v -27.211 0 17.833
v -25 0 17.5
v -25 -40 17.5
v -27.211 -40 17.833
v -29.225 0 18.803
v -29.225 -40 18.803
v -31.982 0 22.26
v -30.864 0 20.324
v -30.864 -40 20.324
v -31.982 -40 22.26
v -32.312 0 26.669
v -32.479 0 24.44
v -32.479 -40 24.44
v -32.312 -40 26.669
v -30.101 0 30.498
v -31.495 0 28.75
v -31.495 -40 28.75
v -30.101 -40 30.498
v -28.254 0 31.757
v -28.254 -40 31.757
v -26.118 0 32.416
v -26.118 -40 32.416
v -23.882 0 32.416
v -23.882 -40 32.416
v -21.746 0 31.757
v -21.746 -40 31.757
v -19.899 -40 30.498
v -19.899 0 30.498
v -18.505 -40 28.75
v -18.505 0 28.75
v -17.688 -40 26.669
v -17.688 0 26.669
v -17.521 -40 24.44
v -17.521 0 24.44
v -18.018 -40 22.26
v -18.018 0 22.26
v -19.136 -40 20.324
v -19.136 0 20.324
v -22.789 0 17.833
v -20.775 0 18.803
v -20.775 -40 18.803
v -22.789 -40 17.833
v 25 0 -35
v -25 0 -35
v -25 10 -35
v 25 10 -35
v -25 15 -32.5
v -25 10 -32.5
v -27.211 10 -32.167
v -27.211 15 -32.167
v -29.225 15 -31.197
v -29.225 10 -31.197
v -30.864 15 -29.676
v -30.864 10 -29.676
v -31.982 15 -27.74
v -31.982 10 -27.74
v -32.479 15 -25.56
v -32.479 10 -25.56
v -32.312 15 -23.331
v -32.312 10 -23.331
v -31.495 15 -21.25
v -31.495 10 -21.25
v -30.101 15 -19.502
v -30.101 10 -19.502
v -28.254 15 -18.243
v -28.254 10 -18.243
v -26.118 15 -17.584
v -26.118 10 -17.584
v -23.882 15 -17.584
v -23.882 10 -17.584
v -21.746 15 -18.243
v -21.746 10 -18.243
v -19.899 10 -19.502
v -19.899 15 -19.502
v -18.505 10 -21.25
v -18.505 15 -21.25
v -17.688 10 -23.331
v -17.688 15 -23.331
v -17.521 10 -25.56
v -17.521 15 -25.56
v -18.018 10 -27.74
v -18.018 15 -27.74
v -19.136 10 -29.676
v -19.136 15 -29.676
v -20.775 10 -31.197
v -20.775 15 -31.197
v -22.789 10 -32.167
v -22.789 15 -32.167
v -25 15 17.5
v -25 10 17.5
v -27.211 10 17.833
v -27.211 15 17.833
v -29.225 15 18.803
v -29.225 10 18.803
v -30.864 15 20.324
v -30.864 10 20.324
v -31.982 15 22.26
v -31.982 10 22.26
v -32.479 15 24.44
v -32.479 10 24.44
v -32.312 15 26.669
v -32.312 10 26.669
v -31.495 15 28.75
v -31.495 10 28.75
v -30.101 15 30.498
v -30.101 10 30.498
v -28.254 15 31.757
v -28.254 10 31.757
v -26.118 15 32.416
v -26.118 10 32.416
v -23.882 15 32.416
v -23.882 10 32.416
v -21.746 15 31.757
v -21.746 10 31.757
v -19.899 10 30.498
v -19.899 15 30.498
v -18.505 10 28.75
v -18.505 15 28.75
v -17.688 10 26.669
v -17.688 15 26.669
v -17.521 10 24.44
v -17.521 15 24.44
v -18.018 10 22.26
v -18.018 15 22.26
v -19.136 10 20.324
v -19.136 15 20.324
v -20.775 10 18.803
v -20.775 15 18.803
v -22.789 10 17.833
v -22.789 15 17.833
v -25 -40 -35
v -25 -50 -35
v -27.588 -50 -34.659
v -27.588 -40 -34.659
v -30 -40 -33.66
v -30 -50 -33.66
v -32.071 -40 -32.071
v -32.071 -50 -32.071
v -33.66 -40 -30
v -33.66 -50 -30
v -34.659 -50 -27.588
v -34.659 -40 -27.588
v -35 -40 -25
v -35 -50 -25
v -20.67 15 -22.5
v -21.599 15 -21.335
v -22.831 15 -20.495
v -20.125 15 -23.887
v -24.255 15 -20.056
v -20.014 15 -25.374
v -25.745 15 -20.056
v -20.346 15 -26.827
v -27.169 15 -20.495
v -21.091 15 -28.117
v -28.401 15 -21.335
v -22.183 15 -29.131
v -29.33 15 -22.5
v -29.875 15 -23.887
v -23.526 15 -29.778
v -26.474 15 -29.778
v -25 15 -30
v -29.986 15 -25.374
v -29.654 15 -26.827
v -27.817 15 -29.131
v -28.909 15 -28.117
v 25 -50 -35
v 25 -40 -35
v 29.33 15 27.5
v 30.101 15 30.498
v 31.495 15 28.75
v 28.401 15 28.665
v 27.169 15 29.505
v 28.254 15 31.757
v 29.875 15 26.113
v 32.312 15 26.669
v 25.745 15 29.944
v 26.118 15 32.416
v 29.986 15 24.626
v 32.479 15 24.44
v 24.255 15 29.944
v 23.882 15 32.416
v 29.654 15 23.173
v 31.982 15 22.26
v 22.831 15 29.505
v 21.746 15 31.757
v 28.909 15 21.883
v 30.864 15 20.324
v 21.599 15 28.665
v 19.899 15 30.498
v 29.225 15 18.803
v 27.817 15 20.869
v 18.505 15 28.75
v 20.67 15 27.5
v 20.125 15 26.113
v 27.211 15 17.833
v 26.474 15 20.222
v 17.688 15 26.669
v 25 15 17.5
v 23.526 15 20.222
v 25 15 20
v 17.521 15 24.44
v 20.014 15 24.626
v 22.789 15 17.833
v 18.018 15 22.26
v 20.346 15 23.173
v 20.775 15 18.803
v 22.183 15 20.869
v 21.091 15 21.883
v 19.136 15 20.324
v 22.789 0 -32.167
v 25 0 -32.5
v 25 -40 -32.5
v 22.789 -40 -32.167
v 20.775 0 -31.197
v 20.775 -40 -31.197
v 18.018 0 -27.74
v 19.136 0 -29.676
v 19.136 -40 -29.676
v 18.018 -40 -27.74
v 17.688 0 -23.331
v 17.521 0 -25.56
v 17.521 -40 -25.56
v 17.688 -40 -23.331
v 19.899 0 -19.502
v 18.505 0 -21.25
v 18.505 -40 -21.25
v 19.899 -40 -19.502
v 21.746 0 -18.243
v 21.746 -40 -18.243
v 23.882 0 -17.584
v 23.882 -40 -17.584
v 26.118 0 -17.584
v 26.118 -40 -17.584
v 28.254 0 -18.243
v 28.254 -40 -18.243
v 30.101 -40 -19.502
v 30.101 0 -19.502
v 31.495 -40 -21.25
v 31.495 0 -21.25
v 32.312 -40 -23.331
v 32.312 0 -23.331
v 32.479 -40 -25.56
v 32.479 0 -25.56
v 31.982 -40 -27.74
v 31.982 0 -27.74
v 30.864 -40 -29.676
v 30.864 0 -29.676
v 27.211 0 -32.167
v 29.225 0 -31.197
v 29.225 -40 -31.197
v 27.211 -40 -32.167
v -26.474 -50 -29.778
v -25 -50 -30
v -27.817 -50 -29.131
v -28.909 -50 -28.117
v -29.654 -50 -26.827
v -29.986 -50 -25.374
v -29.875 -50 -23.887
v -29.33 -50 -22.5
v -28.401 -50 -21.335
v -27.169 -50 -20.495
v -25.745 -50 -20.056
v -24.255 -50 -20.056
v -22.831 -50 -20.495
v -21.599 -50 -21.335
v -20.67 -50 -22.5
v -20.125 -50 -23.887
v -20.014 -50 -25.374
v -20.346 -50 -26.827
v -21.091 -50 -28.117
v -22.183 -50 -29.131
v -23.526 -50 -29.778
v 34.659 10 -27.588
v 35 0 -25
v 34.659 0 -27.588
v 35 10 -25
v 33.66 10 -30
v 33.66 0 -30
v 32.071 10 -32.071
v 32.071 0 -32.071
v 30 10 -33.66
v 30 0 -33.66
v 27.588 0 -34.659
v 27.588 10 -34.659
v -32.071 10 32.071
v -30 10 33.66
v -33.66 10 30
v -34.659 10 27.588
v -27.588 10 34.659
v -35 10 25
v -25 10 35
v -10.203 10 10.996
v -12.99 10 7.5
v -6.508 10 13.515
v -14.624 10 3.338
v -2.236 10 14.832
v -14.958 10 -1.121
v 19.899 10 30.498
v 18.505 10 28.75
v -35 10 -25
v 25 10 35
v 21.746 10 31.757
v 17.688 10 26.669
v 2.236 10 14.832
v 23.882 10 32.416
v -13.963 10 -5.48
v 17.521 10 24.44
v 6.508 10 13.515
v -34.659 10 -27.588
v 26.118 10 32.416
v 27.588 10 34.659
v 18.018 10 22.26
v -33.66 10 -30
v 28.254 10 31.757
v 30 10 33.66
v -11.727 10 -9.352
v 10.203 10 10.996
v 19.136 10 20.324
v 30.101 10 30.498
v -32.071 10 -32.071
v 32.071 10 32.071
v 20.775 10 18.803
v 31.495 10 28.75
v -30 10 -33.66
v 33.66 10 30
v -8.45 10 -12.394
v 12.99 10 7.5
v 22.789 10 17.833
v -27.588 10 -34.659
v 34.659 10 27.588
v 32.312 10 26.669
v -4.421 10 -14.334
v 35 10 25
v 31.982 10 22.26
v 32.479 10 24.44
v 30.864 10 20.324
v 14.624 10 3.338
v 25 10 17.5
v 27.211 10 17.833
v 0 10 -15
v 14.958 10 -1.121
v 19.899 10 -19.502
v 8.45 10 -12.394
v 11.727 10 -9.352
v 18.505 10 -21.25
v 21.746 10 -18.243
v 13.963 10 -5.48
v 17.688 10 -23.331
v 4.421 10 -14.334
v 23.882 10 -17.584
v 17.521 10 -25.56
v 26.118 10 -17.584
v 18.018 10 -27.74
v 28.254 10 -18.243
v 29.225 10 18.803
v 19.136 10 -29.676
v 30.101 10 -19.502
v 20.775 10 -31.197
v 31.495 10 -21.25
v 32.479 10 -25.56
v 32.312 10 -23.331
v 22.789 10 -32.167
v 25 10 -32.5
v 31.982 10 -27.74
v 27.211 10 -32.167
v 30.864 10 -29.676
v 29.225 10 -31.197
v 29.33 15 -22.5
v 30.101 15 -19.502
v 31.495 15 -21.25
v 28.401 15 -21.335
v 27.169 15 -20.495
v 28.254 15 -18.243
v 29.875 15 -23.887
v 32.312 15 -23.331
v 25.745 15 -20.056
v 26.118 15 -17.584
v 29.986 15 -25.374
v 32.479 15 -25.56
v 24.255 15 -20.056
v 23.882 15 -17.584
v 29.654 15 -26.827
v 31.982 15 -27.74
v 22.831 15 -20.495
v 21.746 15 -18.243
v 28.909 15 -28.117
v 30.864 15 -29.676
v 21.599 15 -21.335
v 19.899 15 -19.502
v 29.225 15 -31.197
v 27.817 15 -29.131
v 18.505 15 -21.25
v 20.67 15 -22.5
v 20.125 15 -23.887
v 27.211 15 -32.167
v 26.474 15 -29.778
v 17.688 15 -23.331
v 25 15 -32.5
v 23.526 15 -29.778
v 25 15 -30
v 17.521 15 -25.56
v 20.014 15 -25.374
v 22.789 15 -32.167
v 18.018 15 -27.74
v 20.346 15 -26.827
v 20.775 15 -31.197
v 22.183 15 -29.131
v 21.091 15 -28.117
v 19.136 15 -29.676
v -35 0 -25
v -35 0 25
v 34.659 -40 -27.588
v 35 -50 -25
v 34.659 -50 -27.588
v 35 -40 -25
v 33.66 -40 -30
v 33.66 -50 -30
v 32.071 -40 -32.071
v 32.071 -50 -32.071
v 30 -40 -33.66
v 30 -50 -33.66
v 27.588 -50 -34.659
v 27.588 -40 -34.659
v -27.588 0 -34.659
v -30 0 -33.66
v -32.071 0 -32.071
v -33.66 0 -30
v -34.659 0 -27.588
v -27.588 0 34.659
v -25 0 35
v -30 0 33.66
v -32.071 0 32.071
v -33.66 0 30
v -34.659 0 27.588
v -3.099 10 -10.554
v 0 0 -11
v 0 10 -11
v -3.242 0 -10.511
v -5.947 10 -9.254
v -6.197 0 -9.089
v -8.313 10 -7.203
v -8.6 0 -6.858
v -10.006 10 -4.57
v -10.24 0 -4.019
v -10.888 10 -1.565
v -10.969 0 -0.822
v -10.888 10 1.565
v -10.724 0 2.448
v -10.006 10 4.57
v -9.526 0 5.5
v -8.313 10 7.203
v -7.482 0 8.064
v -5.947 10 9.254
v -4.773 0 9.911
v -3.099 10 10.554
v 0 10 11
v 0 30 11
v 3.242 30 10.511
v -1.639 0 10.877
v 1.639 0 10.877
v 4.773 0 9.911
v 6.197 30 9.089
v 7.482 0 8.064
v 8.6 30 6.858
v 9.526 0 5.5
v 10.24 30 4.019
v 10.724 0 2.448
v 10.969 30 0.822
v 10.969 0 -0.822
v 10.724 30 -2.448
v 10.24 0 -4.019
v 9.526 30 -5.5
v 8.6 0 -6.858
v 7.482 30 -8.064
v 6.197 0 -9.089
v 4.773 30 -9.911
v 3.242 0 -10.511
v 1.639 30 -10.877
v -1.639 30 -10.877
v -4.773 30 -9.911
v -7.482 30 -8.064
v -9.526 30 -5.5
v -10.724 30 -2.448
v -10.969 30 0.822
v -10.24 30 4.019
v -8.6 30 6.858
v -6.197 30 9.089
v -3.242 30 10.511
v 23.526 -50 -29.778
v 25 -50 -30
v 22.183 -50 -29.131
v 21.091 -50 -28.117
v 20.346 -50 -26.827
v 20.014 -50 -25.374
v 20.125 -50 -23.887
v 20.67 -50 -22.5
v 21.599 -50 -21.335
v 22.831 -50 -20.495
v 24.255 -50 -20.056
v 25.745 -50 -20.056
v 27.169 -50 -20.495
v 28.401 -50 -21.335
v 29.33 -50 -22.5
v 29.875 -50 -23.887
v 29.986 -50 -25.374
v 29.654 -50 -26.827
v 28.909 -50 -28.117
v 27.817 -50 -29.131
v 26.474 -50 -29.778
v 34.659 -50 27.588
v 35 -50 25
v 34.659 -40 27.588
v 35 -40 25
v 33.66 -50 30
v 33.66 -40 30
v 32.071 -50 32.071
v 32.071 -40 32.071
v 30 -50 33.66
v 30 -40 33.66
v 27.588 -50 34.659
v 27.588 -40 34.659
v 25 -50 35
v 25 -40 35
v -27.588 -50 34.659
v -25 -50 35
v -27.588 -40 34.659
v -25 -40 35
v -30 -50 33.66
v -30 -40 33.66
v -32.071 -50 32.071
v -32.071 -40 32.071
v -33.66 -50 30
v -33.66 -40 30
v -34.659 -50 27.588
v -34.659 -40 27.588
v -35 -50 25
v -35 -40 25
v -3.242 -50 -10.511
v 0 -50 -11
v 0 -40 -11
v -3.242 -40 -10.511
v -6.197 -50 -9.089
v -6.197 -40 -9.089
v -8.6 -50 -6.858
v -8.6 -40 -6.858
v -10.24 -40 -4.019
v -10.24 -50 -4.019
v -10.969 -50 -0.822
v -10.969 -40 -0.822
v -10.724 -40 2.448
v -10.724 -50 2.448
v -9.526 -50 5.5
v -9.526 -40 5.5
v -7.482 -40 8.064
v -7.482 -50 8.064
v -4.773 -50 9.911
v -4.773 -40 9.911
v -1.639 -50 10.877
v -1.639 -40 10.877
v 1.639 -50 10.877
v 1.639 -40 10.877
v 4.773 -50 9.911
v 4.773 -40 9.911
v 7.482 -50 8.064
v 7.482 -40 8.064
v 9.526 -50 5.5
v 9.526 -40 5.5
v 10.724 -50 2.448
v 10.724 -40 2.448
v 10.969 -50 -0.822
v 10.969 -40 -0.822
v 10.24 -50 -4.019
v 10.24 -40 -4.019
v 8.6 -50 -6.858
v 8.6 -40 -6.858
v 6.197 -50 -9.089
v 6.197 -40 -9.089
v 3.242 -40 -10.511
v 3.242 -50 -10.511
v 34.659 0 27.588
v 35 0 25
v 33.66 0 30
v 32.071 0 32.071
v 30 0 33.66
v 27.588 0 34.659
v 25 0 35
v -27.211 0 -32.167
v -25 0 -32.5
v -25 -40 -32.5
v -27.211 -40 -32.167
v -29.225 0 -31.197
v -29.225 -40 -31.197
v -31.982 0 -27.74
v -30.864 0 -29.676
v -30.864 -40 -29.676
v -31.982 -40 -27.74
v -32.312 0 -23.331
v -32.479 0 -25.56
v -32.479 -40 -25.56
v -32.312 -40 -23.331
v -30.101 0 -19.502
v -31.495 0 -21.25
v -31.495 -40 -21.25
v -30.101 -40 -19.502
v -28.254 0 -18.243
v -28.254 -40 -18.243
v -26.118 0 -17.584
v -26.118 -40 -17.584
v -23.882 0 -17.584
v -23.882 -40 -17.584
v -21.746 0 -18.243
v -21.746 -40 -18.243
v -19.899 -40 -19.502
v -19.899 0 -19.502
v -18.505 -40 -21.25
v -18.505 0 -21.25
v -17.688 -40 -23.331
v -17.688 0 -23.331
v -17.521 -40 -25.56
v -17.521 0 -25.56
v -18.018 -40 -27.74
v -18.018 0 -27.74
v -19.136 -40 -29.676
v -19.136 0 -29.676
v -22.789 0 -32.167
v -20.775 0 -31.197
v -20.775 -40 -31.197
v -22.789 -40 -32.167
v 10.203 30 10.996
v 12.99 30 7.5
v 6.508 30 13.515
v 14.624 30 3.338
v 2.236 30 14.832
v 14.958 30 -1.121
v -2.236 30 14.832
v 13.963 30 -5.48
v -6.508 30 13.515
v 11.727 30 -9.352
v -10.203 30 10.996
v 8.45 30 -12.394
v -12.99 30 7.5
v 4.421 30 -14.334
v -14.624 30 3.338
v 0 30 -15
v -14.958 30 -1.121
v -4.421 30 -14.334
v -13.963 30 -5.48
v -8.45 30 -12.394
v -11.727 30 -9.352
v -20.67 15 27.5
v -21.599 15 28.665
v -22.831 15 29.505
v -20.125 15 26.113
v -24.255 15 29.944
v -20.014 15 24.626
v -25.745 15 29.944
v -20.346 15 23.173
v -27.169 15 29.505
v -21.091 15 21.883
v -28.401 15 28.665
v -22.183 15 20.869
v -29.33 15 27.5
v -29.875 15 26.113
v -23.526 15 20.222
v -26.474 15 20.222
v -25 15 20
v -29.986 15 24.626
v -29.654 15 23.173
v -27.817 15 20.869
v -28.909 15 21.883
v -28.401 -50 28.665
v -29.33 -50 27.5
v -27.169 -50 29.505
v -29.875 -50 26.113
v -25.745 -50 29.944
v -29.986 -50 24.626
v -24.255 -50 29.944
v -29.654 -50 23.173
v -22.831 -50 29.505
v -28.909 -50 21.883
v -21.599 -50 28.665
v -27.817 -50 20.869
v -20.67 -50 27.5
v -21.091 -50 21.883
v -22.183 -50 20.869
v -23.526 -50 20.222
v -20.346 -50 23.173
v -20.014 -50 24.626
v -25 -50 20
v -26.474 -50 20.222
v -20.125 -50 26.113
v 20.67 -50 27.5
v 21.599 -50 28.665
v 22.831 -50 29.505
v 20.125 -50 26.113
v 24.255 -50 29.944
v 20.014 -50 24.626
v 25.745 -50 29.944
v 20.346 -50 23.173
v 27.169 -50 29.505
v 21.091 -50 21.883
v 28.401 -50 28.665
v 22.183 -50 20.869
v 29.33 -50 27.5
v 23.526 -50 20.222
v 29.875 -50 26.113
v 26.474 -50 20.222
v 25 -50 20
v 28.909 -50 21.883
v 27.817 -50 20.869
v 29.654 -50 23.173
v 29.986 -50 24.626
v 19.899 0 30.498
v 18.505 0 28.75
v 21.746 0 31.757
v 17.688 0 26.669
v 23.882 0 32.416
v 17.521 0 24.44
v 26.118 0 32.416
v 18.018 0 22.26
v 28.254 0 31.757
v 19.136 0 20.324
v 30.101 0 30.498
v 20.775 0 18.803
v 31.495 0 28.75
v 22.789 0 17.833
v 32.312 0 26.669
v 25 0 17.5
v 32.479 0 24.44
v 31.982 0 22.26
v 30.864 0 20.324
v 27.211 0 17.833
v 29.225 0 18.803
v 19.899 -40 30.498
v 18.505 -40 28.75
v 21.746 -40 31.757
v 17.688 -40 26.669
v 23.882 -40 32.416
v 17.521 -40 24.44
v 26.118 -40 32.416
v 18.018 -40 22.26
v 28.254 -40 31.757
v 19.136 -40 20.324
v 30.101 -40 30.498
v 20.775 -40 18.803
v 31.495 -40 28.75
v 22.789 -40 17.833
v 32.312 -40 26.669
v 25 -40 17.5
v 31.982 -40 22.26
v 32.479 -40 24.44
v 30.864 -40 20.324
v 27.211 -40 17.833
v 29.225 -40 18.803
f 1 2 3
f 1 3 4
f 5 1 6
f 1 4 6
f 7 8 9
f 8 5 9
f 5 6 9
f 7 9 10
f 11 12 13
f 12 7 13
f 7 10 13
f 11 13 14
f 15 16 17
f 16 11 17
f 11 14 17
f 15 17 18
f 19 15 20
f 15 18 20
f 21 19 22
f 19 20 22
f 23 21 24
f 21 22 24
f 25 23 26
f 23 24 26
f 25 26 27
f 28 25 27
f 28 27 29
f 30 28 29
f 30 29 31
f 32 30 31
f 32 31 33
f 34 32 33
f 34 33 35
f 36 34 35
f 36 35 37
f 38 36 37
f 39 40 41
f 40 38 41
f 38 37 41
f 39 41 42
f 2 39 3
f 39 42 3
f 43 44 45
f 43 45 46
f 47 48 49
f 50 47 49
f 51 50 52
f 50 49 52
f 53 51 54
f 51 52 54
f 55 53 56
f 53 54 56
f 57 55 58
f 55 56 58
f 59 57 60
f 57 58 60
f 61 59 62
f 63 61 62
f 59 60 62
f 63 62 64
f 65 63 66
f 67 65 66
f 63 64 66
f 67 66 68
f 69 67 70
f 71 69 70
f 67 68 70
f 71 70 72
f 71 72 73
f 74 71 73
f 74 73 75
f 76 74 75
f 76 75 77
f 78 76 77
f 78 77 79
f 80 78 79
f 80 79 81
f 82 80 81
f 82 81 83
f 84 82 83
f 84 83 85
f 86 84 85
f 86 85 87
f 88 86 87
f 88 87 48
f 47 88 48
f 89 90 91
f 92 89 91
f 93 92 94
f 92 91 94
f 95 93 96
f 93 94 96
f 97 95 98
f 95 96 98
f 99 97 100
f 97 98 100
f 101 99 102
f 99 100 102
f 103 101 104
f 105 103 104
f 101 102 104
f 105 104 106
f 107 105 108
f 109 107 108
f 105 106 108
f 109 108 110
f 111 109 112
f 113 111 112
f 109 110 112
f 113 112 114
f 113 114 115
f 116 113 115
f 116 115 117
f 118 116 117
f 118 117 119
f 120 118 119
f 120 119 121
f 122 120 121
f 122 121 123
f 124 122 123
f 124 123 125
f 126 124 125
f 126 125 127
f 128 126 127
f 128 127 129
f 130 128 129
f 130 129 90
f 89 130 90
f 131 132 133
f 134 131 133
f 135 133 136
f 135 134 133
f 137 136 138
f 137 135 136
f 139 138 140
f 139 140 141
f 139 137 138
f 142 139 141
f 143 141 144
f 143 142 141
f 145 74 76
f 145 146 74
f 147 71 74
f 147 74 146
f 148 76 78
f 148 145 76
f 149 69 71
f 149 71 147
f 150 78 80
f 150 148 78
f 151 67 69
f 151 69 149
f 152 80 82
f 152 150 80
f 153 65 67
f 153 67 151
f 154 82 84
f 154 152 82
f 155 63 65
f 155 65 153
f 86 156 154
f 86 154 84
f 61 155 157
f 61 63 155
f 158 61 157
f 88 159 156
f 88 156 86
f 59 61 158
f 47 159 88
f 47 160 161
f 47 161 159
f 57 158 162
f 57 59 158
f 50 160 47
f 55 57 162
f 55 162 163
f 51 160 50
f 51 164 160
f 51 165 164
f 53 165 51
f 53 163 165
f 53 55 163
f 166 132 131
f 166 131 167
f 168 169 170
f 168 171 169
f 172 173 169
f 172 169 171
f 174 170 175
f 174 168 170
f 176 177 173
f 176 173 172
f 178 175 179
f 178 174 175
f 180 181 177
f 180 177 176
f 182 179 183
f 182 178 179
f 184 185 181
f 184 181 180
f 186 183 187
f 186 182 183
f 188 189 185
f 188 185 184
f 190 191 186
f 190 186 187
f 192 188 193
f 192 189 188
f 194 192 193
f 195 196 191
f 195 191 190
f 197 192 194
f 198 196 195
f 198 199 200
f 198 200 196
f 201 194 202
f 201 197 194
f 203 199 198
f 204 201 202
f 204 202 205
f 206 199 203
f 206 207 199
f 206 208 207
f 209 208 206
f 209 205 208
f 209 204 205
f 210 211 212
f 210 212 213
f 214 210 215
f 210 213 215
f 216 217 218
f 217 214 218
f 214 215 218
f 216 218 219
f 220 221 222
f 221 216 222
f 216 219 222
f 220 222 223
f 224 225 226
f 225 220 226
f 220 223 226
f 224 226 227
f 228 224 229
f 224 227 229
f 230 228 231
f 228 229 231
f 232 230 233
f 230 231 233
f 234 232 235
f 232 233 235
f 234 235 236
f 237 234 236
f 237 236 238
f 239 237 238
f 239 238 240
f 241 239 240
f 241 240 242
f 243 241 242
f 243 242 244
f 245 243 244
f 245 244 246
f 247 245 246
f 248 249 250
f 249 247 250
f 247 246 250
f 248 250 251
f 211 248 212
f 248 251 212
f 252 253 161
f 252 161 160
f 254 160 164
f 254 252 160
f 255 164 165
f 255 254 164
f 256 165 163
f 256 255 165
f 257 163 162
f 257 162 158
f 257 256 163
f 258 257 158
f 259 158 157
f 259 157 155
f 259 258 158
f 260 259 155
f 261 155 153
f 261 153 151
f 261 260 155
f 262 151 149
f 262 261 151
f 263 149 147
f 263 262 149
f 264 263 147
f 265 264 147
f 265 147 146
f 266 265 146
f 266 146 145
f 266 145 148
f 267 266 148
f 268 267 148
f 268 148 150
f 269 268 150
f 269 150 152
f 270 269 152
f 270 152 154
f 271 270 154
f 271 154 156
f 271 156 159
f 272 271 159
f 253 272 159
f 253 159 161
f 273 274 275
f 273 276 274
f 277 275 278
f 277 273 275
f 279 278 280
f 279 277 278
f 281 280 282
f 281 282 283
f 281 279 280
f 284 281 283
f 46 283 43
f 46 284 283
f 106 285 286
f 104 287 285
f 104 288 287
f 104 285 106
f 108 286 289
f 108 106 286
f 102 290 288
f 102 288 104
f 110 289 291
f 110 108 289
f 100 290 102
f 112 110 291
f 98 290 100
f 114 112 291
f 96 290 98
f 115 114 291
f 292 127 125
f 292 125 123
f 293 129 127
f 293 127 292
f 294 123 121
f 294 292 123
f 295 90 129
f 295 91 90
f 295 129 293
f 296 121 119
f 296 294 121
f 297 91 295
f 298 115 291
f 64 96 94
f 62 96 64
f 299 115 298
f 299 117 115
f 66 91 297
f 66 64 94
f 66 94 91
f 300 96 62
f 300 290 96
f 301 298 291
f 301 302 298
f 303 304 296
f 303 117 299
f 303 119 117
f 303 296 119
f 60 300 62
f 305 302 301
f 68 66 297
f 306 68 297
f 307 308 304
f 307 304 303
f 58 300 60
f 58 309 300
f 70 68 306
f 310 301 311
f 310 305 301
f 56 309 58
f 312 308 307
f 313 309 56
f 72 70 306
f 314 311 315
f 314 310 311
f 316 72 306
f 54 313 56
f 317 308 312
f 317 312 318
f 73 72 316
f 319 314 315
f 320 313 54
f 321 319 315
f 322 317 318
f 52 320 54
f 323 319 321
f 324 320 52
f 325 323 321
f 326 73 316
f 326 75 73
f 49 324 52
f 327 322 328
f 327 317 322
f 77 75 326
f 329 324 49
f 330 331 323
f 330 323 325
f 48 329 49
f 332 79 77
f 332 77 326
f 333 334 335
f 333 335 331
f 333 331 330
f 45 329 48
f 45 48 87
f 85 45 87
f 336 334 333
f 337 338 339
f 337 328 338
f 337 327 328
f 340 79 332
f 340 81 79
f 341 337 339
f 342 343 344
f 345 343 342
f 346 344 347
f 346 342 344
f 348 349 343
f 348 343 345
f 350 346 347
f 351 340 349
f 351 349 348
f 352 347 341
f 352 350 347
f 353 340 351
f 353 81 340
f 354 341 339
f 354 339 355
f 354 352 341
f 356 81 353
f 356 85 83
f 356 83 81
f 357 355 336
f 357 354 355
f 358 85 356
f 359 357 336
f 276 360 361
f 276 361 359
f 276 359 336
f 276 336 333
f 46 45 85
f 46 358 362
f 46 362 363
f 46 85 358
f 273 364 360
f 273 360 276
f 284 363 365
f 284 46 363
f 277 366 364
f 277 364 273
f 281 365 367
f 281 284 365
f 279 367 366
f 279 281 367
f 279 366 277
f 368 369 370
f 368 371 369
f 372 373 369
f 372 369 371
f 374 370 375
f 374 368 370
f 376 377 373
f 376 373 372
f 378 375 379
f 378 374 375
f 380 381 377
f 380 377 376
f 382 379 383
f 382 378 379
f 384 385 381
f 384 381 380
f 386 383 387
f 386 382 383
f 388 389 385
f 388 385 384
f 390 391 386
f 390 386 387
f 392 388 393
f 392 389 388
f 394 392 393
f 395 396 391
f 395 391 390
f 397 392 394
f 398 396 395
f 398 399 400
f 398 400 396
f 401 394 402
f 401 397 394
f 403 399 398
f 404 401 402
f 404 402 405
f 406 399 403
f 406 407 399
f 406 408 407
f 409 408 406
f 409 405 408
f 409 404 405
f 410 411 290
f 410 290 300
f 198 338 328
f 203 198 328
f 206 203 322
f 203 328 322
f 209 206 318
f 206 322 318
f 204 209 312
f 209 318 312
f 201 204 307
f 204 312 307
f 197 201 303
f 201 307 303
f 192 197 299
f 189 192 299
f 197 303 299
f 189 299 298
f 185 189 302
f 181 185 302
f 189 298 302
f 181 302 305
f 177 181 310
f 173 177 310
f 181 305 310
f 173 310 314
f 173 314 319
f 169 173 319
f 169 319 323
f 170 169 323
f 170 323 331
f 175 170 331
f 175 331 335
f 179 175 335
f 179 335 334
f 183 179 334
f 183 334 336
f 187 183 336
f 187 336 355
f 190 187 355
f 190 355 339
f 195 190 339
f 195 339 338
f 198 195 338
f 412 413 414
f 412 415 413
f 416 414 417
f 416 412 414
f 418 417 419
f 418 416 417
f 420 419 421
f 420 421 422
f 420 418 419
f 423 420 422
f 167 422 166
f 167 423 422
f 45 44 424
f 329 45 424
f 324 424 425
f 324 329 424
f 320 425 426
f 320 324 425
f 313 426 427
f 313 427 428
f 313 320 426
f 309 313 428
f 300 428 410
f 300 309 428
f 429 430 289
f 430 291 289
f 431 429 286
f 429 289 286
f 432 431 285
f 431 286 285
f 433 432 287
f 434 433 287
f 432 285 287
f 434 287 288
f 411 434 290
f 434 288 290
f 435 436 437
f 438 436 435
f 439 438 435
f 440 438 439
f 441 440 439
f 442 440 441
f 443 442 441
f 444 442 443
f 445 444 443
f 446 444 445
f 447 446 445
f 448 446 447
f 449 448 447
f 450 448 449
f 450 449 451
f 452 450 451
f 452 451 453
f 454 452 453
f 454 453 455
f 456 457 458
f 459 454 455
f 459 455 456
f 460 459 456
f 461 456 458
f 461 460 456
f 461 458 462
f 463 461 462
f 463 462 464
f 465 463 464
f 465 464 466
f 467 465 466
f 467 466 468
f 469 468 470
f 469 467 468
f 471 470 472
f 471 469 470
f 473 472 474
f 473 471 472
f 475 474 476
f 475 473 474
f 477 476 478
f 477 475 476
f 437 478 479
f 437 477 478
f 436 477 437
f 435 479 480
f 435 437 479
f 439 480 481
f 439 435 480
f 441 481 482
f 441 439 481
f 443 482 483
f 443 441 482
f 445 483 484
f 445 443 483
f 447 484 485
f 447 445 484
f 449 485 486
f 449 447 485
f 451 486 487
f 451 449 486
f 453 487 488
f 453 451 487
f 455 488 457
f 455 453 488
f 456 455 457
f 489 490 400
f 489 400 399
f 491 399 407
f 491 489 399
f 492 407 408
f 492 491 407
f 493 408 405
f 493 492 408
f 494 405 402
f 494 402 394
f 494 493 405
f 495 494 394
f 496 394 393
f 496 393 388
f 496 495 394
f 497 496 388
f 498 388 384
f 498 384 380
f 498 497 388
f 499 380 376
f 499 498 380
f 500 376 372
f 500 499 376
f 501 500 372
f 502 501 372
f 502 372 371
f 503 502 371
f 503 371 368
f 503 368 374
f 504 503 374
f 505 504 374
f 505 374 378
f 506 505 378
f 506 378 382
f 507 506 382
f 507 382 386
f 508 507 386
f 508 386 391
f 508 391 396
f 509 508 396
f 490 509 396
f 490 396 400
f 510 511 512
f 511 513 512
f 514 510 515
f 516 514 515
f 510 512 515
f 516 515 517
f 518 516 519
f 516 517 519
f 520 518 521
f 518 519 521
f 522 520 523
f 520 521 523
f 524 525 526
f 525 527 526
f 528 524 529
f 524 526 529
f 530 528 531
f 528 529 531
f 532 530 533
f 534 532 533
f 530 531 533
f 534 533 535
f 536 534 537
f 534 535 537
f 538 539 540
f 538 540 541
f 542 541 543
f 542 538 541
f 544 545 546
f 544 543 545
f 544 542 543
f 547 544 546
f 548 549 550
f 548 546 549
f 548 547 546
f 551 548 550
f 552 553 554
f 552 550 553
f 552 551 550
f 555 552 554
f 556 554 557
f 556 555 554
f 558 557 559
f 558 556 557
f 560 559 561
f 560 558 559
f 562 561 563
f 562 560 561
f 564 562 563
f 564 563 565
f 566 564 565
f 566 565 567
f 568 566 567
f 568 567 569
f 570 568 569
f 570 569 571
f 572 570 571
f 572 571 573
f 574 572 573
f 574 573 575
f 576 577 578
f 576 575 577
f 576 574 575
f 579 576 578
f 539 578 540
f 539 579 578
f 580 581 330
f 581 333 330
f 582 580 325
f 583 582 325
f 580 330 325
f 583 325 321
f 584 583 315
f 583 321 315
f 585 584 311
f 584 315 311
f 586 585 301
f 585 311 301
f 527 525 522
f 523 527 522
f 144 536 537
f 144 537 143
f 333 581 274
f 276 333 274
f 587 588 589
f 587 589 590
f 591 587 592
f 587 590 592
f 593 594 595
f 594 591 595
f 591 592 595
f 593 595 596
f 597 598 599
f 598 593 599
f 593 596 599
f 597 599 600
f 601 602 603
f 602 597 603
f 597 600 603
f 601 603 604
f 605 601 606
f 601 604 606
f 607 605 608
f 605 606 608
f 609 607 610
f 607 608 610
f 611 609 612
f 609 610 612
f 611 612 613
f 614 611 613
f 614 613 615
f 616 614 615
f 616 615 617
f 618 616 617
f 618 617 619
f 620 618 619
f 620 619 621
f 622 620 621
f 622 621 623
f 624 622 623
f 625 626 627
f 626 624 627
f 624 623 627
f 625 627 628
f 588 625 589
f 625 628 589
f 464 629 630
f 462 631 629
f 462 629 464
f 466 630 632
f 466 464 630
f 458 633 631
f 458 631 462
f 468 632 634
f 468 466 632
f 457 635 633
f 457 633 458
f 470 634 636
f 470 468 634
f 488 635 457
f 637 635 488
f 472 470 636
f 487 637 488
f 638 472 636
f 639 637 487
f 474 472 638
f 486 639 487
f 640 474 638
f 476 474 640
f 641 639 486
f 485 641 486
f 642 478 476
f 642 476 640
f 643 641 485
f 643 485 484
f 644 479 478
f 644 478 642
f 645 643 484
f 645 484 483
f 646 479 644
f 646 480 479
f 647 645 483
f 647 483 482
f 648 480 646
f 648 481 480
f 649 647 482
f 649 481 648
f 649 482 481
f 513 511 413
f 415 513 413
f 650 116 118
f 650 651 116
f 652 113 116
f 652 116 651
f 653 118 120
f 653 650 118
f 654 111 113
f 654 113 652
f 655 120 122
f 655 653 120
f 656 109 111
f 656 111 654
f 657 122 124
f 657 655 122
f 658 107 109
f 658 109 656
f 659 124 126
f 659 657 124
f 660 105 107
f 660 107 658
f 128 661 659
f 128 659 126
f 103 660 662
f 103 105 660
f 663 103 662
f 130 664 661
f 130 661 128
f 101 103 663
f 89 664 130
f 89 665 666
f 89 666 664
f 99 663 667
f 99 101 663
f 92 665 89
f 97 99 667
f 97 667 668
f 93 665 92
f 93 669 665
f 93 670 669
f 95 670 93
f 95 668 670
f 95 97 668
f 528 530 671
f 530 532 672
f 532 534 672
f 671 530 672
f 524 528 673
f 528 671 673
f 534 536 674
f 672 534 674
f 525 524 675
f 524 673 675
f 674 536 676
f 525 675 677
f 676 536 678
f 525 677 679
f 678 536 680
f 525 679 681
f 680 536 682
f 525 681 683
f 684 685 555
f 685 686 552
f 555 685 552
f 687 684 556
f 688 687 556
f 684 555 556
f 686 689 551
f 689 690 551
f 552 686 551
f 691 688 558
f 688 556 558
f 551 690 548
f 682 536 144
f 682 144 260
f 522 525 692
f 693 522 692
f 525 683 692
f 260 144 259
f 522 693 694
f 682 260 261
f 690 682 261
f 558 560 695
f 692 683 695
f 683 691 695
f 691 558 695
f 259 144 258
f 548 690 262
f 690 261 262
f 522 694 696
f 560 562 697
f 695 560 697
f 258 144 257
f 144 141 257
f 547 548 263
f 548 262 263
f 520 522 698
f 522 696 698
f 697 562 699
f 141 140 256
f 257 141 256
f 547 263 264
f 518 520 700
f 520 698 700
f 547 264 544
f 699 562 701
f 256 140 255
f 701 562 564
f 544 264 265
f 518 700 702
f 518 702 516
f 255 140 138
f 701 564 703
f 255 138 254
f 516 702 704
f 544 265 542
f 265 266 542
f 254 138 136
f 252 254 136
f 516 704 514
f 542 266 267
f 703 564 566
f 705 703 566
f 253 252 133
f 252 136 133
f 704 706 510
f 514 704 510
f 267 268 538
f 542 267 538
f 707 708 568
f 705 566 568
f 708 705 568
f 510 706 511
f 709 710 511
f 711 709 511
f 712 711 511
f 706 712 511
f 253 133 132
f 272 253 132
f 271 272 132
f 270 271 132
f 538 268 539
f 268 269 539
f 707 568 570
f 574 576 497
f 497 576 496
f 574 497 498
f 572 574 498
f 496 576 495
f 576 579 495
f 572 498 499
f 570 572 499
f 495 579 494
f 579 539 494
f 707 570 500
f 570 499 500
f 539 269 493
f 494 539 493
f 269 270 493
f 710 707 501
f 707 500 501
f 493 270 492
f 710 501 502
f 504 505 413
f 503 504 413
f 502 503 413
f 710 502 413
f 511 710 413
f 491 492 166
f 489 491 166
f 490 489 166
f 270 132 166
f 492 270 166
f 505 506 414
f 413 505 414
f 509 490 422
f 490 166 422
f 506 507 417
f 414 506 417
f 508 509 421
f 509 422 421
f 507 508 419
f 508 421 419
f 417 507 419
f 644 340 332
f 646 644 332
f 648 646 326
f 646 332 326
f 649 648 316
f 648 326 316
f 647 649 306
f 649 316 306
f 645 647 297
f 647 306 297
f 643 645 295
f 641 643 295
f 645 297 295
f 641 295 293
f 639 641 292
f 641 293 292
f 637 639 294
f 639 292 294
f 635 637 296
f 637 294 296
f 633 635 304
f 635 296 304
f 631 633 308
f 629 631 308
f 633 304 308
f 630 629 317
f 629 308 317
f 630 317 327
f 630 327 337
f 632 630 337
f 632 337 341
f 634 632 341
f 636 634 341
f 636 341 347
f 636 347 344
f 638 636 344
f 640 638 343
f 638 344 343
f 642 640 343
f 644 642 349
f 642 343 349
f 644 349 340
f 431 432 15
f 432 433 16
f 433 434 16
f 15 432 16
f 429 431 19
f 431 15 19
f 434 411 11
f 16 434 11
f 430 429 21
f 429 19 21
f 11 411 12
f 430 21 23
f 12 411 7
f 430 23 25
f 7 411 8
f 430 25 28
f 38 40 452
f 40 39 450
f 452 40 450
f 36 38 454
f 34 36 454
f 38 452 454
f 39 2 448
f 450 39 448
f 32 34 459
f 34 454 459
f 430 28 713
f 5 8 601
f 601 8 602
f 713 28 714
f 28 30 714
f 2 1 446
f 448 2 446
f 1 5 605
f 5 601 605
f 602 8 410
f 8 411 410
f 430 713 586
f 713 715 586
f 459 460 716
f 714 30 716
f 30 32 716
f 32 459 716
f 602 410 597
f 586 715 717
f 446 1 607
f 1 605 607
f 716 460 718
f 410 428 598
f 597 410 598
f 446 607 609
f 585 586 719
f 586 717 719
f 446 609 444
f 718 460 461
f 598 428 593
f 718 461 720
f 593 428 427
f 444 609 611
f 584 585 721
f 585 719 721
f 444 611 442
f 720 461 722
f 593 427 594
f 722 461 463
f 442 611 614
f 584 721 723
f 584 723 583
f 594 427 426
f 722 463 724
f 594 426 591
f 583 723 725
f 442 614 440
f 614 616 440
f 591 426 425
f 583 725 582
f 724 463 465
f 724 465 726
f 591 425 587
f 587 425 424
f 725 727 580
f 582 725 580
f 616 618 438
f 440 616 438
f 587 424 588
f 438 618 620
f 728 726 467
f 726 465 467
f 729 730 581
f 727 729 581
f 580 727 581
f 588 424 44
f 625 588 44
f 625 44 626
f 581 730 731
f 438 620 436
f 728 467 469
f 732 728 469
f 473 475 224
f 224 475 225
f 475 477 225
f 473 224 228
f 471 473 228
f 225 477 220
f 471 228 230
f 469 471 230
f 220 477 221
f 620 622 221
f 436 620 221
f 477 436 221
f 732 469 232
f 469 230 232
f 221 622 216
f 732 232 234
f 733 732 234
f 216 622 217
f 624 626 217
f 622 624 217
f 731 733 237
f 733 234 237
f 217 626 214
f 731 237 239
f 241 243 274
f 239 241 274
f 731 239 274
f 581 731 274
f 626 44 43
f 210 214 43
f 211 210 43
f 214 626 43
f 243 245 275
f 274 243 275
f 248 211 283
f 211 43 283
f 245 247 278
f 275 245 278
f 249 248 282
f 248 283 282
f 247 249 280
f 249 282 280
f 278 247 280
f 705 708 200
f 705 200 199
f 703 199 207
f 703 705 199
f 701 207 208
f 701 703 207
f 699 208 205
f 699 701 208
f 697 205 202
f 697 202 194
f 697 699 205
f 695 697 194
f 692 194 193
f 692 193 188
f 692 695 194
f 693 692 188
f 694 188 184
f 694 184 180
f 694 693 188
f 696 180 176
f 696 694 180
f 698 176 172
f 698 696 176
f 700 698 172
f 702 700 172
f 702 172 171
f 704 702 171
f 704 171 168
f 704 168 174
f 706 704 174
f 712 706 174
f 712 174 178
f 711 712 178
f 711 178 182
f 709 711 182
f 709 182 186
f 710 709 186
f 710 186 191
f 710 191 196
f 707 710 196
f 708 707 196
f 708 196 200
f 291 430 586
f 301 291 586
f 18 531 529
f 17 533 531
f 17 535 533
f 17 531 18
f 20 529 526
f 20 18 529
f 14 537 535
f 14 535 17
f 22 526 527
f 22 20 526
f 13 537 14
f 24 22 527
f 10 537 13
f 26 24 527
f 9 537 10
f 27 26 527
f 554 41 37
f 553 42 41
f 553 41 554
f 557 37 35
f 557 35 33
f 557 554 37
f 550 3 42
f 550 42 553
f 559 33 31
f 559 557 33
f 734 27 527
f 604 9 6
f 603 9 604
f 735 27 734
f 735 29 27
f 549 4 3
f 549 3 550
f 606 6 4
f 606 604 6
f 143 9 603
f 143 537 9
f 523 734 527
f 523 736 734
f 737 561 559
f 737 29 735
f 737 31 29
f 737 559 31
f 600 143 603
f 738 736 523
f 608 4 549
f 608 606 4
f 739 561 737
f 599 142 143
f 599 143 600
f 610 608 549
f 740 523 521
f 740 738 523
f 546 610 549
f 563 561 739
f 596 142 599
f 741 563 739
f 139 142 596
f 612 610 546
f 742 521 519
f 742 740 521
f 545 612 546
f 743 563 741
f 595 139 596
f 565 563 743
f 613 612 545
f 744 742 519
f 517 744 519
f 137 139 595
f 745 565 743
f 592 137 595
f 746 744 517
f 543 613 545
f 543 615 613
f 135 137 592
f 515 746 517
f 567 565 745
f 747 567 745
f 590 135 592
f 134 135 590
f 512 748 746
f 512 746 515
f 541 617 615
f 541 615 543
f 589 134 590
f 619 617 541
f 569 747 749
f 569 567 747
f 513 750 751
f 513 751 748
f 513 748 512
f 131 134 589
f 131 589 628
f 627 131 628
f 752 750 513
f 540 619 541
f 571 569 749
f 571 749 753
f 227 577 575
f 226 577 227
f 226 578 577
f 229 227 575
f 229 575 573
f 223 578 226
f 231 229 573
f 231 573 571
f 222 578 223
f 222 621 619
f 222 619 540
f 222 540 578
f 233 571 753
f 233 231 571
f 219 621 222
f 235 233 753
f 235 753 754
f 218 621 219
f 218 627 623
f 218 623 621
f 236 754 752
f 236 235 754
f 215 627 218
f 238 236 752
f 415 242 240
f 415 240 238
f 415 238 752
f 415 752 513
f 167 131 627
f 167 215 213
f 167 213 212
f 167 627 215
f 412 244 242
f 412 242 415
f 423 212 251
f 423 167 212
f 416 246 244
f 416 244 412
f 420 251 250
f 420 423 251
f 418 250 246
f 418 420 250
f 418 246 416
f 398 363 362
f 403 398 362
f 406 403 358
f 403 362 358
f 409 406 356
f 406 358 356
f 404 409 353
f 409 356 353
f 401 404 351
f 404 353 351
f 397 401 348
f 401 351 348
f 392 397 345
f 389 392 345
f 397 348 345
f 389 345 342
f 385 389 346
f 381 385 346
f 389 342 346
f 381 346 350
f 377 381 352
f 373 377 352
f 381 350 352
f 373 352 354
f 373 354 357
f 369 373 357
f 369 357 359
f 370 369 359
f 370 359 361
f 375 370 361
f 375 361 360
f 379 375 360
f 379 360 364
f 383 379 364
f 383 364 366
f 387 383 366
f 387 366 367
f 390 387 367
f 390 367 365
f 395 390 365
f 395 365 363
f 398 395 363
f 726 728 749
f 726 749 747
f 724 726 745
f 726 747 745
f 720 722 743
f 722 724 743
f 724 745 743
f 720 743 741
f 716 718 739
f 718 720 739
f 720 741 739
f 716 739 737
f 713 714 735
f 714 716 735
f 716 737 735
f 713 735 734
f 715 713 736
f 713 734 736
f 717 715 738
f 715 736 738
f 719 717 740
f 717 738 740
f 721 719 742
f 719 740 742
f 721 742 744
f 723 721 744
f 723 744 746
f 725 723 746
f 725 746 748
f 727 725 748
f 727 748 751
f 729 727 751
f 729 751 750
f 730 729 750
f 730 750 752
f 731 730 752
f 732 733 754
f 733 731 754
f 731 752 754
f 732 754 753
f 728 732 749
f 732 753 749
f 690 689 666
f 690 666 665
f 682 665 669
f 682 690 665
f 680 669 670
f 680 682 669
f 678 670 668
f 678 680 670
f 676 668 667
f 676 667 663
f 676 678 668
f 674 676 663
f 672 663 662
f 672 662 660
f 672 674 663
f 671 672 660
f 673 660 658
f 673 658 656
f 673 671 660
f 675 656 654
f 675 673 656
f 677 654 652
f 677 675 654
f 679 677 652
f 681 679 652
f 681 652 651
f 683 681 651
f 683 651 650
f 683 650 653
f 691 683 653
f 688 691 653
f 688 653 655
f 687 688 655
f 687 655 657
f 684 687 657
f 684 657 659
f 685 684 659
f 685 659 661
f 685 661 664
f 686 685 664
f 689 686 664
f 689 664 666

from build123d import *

# Parameters (mm, degrees)
SKETCH1_W                = 70
SKETCH1_H                = 70
BOSS_EXTRUDE1_DEPTH      = 10
LPATTERN2_COUNT          = 2
LPATTERN2_PITCH          = 50
SKETCH2_R                = 15
SKETCH2_R_2              = 11
BOSS_EXTRUDE2_DEPTH      = 20
BOSS_EXTRUDE3_DEPTH      = 5
BOSS_EXTRUDE3_DEPTH_BACK = 55
SKETCH2_3_R              = 7.5
SKETCH2_3_R_2            = 5
CUT_EXTRUDE1_START       = -100
SKETCH3_R                = 5
SKETCH3_R_2              = 11
CUT_EXTRUDE1_DEPTH       = 100
FILLET1_R                = 10


with BuildPart() as part:
    # Sketch1 → Boss-Extrude1 (new body)
    with BuildSketch(Plane(origin=(0, 0, 0), x_dir=(1, 0, 0), z_dir=(0, 1, 0))):
        Rectangle(SKETCH1_W, SKETCH1_H)
    extrude(amount=BOSS_EXTRUDE1_DEPTH)


with BuildPart() as lpattern2_1:
    # LPattern2: pattern copy
    add(part.part.moved(Location(Vector(0, -1, 0) * (1 * LPATTERN2_PITCH))))


with BuildPart() as part_1:
    add(part.part)

    # Sketch2 → Boss-Extrude2 (add)
    with BuildSketch(Plane(origin=(0, 10, 0), x_dir=(1, 0, 0), z_dir=(0, 1, 0))):
        Circle(SKETCH2_R)
        Circle(SKETCH2_R_2, mode=Mode.SUBTRACT)
    extrude(amount=BOSS_EXTRUDE2_DEPTH)

    add(lpattern2_1.part)  # Boss-Extrude3 merges LPattern2_1
    # Sketch2<3> → Boss-Extrude3 (add, two sides: drawn at the far end of the back side and taken through both)
    # profile 1 of 4: a face of its own
    with BuildSketch(Plane(origin=(0, 10, 0), x_dir=(1, 0, 0), z_dir=(0, 1, 0)).offset(-BOSS_EXTRUDE3_DEPTH_BACK)):
        with Locations((25, 25)):
            Circle(SKETCH2_3_R)
        with Locations((25, 25)):
            Circle(SKETCH2_3_R_2, mode=Mode.SUBTRACT)
    # profile 2 of 4: a face of its own
    with BuildSketch(Plane(origin=(0, 10, 0), x_dir=(1, 0, 0), z_dir=(0, 1, 0)).offset(-BOSS_EXTRUDE3_DEPTH_BACK)):
        with Locations((-25, 25)):
            Circle(SKETCH2_3_R)
        with Locations((-25, 25)):
            Circle(SKETCH2_3_R_2, mode=Mode.SUBTRACT)
    # profile 3 of 4: a face of its own
    with BuildSketch(Plane(origin=(0, 10, 0), x_dir=(1, 0, 0), z_dir=(0, 1, 0)).offset(-BOSS_EXTRUDE3_DEPTH_BACK)):
        with Locations((25, -25)):
            Circle(SKETCH2_3_R)
        with Locations((25, -25)):
            Circle(SKETCH2_3_R_2, mode=Mode.SUBTRACT)
    # profile 4 of 4: a face of its own
    with BuildSketch(Plane(origin=(0, 10, 0), x_dir=(1, 0, 0), z_dir=(0, 1, 0)).offset(-BOSS_EXTRUDE3_DEPTH_BACK)):
        with Locations((-25, -25)):
            Circle(SKETCH2_3_R)
        with Locations((-25, -25)):
            Circle(SKETCH2_3_R_2, mode=Mode.SUBTRACT)
    extrude(amount=BOSS_EXTRUDE3_DEPTH + BOSS_EXTRUDE3_DEPTH_BACK)

    # Sketch3 → Cut-Extrude1 (cut)
    with BuildSketch(Plane(origin=(0, 10, 0), x_dir=(1, 0, 0), z_dir=(0, 1, 0)).offset(CUT_EXTRUDE1_START)):
        with Locations((-25, -25)):
            Circle(SKETCH3_R)
        with Locations((-25, 25)):
            Circle(SKETCH3_R)
        with Locations((25, -25)):
            Circle(SKETCH3_R)
        with Locations((25, 25)):
            Circle(SKETCH3_R)
        Circle(SKETCH3_R_2)
    extrude(amount=CUT_EXTRUDE1_DEPTH, mode=Mode.SUBTRACT)

    # Fillet1
    fillet1_edges = [part_1.edges().sort_by_distance(p)[0] for p in [
        (35, -45, 35),
        (35, -45, -35),
        (-35, -45, -35),
        (-35, -45, 35),
        (-35, 5, 35),
        (-35, 5, -35),
        (35, 5, -35),
        (35, 5, 35),
    ]]
    fillet(fillet1_edges, radius=FILLET1_R)


solid = part_1.part
